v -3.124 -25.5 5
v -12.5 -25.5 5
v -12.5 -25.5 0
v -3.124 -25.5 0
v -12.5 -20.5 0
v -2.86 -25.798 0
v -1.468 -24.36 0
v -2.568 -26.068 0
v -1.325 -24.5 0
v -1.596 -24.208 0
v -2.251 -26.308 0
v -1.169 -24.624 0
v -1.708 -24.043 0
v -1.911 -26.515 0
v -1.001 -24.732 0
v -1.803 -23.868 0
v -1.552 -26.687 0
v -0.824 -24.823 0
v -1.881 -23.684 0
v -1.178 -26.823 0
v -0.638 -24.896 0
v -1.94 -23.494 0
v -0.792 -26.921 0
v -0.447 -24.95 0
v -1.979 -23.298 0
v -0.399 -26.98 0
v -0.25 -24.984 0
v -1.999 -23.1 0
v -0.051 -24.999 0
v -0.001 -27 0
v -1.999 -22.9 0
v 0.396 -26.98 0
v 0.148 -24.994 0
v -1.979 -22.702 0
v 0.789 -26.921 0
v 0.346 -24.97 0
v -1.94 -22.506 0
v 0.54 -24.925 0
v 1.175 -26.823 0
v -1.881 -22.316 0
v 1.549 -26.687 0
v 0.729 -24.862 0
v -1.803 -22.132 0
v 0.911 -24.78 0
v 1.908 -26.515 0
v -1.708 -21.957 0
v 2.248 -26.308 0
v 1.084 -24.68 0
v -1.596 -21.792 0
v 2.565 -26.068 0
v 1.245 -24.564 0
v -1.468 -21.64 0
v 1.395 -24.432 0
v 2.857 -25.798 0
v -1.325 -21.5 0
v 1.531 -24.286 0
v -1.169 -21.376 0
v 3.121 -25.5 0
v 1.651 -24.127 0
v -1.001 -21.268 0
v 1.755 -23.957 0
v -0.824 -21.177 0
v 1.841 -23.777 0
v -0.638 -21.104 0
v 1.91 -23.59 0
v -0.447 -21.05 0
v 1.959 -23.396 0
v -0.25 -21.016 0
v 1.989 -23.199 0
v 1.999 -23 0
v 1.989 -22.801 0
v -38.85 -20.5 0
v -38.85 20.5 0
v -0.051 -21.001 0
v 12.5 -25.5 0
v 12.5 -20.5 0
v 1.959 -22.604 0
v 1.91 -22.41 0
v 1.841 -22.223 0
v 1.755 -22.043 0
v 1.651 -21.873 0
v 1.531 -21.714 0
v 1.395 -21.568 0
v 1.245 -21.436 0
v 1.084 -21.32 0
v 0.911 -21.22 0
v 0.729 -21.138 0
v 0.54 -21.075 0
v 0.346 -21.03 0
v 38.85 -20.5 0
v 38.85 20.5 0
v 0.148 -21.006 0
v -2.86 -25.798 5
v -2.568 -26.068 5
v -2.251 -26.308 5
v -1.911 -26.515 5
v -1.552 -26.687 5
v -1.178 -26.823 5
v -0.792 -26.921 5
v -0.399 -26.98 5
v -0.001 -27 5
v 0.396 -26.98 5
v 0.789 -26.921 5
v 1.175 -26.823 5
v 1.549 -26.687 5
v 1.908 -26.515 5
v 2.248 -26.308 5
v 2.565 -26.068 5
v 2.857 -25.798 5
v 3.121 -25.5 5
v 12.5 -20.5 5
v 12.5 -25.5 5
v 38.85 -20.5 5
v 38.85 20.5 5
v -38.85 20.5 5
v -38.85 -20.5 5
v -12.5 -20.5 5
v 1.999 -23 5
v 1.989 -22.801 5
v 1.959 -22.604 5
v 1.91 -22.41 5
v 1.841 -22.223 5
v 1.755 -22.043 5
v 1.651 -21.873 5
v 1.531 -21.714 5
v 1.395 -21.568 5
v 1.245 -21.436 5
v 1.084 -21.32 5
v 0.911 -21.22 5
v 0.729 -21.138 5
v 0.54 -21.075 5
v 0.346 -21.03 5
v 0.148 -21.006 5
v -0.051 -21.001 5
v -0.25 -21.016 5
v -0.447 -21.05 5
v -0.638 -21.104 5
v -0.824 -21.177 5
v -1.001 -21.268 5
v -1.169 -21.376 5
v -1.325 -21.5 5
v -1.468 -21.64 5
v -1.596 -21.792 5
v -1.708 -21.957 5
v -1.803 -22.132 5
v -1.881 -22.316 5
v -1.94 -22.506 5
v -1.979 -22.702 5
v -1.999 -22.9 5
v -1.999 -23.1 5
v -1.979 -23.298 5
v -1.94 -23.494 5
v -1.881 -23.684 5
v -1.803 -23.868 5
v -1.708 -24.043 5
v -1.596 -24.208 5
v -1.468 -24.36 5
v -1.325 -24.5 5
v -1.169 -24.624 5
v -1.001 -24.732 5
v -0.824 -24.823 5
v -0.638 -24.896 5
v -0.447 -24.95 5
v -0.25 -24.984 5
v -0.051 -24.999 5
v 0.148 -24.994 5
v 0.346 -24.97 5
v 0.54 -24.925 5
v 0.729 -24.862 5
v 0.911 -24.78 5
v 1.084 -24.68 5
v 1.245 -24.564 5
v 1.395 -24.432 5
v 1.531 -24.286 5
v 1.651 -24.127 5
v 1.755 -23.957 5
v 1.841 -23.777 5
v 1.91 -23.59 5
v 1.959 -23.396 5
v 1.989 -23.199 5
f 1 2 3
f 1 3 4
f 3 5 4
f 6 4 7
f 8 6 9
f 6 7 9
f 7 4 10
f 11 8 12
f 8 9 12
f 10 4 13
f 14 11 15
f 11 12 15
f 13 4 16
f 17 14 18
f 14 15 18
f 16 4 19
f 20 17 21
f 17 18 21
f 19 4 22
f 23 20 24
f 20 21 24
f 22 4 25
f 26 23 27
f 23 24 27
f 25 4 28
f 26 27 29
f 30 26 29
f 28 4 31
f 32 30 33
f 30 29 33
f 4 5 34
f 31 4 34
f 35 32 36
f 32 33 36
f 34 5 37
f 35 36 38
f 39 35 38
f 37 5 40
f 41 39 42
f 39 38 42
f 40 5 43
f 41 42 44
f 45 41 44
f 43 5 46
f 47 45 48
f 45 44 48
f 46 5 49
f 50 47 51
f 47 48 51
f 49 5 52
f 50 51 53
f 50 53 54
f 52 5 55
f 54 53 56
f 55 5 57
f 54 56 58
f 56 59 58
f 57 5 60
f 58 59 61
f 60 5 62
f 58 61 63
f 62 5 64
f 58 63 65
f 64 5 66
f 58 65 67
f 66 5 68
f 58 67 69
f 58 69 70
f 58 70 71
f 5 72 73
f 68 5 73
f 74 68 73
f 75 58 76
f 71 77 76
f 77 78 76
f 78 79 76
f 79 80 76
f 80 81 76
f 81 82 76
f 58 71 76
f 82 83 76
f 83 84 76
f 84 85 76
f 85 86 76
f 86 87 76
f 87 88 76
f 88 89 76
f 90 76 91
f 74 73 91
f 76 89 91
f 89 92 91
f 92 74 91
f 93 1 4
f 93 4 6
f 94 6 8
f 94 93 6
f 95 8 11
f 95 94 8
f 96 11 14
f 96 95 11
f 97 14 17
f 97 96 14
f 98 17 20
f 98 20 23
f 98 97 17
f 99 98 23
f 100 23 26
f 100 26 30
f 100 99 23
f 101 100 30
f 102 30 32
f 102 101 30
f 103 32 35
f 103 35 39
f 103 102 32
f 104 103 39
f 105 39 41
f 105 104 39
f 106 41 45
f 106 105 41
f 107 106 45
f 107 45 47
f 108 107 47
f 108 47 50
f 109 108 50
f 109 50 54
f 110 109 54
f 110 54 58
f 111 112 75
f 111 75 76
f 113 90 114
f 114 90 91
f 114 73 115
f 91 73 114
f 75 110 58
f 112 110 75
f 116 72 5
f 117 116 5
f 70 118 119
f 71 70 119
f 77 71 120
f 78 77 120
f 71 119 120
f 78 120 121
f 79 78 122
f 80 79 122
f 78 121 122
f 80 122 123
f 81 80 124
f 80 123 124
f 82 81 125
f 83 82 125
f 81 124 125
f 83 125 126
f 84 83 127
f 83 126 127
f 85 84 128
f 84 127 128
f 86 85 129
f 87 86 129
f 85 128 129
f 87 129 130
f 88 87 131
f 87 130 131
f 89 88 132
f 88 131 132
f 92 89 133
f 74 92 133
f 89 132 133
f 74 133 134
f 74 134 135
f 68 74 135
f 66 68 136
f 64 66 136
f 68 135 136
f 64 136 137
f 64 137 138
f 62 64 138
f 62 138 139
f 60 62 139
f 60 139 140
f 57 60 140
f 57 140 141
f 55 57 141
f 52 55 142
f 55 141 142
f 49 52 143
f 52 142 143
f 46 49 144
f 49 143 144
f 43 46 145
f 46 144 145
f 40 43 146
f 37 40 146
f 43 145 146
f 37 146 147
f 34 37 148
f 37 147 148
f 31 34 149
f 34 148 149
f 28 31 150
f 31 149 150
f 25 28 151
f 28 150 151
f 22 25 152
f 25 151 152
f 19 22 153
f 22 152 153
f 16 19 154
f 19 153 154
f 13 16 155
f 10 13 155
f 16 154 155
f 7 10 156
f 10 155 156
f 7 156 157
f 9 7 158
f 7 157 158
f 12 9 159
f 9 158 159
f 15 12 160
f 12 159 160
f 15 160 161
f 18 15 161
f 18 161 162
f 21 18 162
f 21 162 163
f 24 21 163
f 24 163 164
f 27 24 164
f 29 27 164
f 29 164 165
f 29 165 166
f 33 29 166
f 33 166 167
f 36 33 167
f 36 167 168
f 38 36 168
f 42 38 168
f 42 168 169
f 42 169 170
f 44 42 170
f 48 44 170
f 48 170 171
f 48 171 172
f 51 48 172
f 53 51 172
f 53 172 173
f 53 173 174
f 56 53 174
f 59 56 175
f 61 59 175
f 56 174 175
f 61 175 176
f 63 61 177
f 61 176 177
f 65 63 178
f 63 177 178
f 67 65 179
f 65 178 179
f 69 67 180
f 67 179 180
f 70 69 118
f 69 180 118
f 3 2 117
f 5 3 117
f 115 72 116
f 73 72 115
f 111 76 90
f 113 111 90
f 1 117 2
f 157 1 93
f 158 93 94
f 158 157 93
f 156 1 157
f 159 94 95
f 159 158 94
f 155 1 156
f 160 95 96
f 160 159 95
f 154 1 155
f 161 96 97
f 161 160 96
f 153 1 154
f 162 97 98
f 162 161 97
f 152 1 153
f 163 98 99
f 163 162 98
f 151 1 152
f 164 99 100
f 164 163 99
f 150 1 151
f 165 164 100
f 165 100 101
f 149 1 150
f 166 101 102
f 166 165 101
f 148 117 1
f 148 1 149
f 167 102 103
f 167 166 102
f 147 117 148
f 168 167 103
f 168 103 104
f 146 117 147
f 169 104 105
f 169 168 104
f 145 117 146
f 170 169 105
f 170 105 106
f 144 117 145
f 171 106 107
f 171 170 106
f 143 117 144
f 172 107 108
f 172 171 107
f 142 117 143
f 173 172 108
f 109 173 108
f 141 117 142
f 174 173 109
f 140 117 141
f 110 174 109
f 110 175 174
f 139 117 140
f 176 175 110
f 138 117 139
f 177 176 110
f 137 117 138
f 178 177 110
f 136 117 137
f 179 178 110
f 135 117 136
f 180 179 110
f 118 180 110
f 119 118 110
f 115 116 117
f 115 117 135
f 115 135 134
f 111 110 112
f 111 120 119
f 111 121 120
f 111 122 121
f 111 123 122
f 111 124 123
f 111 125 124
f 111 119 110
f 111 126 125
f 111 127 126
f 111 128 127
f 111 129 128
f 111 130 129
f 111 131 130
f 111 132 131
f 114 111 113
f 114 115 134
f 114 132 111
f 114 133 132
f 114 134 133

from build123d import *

# Parameters (mm, degrees)
SKETCH1_W           = 77.7
SKETCH1_H           = 41
BOSS_EXTRUDE1_DEPTH = 5
SKETCH2_W           = 25
SKETCH2_H           = 5
BOSS_EXTRUDE2_DEPTH = 5
SKETCH3_R           = 2
CUT_EXTRUDE1_DEPTH  = 5
SKETCH4_R           = 4
SKETCH4_R_2         = 2
BOSS_EXTRUDE3_DEPTH = 5


with BuildPart() as part:
    # Sketch1 → Boss-Extrude1 (new body)
    with BuildSketch(Plane.XY):
        Rectangle(SKETCH1_W, SKETCH1_H)
    extrude(amount=BOSS_EXTRUDE1_DEPTH)

    # Sketch2 → Boss-Extrude2 (add)
    with BuildSketch(Plane.XY.offset(5)):
        with Locations((0, -23)):
            Rectangle(SKETCH2_W, SKETCH2_H)
    extrude(amount=-BOSS_EXTRUDE2_DEPTH)

    # Sketch3 → Cut-Extrude1 (cut)
    with BuildSketch(Plane.XY.offset(5)):
        with Locations((-0.001489704, -23)):
            Circle(SKETCH3_R)
    extrude(amount=-CUT_EXTRUDE1_DEPTH, mode=Mode.SUBTRACT)

    # Sketch4 → Boss-Extrude3 (add)
    with BuildSketch(Plane.XY.offset(5)):
        with Locations((-0.001489704, -23)):
            Circle(SKETCH4_R)
        with Locations((-0.001489704, -23)):
            Circle(SKETCH4_R_2, mode=Mode.SUBTRACT)
    extrude(amount=-BOSS_EXTRUDE3_DEPTH)


solid = part.part
